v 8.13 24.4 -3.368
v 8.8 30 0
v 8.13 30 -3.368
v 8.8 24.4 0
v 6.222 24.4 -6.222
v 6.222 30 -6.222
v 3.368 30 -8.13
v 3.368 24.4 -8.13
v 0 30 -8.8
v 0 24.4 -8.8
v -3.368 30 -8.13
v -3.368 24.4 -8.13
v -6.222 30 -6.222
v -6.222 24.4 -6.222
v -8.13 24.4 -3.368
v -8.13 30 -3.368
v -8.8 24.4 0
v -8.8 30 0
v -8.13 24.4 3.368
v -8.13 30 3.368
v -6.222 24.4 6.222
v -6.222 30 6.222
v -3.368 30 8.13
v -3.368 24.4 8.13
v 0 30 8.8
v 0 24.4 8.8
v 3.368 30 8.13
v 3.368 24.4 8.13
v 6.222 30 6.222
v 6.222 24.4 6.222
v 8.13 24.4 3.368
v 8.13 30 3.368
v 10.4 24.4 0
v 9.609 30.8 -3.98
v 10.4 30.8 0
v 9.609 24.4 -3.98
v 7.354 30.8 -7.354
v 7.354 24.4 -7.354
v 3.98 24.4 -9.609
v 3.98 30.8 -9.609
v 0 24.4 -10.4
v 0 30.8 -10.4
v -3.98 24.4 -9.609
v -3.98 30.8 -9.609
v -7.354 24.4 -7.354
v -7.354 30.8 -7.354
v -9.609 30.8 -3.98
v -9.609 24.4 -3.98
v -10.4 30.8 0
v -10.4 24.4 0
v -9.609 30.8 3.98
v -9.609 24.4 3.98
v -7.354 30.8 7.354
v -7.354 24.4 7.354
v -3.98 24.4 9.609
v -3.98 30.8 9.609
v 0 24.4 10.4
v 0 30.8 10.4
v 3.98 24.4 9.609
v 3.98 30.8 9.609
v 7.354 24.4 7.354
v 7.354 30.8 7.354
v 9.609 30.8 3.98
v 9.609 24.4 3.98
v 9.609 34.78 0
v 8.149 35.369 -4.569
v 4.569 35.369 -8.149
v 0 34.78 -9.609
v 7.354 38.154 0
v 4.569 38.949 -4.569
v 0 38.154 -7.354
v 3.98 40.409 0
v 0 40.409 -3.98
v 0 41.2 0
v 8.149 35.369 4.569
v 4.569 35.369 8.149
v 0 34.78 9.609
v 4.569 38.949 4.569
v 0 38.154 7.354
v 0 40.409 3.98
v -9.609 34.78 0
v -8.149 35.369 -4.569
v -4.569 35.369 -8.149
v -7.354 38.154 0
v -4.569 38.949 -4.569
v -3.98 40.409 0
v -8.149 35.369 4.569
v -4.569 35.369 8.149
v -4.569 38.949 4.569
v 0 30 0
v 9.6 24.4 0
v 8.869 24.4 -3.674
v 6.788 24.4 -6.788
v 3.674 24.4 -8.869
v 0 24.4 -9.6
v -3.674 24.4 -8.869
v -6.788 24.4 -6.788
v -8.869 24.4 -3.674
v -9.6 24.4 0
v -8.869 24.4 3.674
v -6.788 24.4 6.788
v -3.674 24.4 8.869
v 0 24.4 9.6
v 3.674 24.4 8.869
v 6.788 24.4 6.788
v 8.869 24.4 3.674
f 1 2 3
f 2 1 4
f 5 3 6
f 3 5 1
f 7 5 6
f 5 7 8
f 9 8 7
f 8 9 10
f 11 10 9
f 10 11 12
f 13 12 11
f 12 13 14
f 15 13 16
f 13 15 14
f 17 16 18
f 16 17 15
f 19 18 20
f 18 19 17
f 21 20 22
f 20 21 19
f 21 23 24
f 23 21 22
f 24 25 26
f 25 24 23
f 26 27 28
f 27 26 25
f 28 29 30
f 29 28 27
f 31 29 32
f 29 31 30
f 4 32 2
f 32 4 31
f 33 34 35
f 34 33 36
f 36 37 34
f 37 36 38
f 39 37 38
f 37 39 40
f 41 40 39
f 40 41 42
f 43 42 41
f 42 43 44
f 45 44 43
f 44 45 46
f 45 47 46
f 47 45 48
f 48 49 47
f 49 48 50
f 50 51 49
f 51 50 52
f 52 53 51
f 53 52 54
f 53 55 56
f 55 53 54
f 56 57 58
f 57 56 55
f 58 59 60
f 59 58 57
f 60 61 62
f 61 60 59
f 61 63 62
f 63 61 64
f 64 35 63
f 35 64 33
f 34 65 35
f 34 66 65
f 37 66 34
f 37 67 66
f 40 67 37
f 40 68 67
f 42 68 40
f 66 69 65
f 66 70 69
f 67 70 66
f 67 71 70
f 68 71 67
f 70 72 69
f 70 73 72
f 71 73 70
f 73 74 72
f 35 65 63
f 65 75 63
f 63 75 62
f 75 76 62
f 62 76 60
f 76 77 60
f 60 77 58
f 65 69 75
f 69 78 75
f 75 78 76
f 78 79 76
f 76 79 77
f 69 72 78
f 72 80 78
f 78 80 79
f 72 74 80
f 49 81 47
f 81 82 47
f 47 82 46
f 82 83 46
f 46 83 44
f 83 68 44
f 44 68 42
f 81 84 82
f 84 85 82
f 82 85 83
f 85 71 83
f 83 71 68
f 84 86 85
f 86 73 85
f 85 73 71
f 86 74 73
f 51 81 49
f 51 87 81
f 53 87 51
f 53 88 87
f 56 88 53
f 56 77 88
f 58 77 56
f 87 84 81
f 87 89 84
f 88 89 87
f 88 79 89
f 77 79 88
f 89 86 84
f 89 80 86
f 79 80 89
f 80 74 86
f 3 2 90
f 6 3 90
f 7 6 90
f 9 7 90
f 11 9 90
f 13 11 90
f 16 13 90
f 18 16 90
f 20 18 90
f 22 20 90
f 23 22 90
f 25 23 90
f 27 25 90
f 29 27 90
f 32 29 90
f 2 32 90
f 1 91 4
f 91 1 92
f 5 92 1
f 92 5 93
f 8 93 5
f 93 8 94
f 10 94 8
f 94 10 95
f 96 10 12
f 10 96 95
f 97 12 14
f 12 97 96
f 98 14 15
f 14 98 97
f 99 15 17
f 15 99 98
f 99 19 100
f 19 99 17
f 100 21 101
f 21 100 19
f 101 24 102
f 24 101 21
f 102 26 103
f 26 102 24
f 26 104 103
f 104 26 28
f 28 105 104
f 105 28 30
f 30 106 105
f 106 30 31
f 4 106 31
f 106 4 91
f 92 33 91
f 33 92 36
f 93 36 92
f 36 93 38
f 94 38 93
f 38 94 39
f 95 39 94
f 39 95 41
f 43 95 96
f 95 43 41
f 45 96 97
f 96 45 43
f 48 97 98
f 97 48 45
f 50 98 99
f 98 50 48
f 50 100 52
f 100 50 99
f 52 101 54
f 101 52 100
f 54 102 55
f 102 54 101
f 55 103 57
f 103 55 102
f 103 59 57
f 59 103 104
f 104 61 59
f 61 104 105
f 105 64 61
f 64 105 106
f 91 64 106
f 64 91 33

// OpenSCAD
// file: ../p/stud3.scad
use <../lib.scad>
use <4-4cyli.scad>
use <4-4disc.scad>
use <4-4edge.scad>
$fa=1; $fs=0.2;
function ldraw_lib__stud3(realsolid=false) = realsolid ? 
    [openscad(translate([0,0,-eps()], o=cylinder(4+eps(), r=4)),2)] : [
// 0 Stud Tube Solid
// 0 Name: stud3.dat
// 0 Author: James Jessiman
// 0 !LDRAW_ORG Primitive UPDATE 2012-01
// 0 !LICENSE Licensed under CC BY 2.0 and CC BY 4.0 : see CAreadme.txt
// 
// 0 BFC CERTIFY CCW
  [0,"BFC","CERTIFY"],
  [0,"BFC","CCW"],
// 
// 0 !HISTORY 2002-04-04 [sbliss] Modified for BFC compliance
// 0 !HISTORY 2002-04-25 [PTadmin] Official Update 2002-02
// 0 !HISTORY 2007-06-24 [PTadmin] Header formatted for Contributor Agreement
// 0 !HISTORY 2008-07-01 [PTadmin] Official Update 2008-01
// 0 !HISTORY 2012-02-16 [Philo] Changed to CCW
// 0 !HISTORY 2012-03-30 [PTadmin] Official Update 2012-01
// 
// 
// 1 16 0 -4 0 4 0 0 0 1 0 0 0 4 4-4edge.dat
  [1,16,0,-4,0,4,0,0,0,1,0,0,0,4, ldraw_lib__4_4edge(realsolid)],
// 1 16 0 0 0 4 0 0 0 1 0 0 0 4 4-4edge.dat
  [1,16,0,0,0,4,0,0,0,1,0,0,0,4, ldraw_lib__4_4edge(realsolid)],
// 1 16 0 -4 0 4 0 0 0 1 0 0 0 4 4-4disc.dat
  [1,16,0,-4,0,4,0,0,0,1,0,0,0,4, ldraw_lib__4_4disc(realsolid)],
// 1 16 0 -4 0 4 0 0 0 4 0 0 0 4 4-4cyli.dat
  [1,16,0,-4,0,4,0,0,0,4,0,0,0,4, ldraw_lib__4_4cyli(realsolid)],
];
module ldraw_lib__stud3(step=0, col=false, unit=2/5, alt=false, line=0.2, solid=!$preview)
    makepoly(ldraw_lib__stud3(solid), step=step, col=col, unit=unit, alt=alt, line=line, solid=solid);
ldraw_lib__stud3(line=0.2);
// file: ../p/stud.scad
use <../lib.scad>
use <4-4cyli.scad>
use <4-4disc.scad>
use <4-4edge.scad>
$fa=1; $fs=0.2;
function ldraw_lib__stud(realsolid=false) = realsolid ? 
    [openscad(translate([0,0,-eps()], o=cylinder(4+eps(), r=6)),2)] : [
// 0 Stud
// 0 Name: stud.dat
// 0 Author: James Jessiman
// 0 !LDRAW_ORG Primitive UPDATE 2012-01
// 0 !LICENSE Licensed under CC BY 2.0 and CC BY 4.0 : see CAreadme.txt
// 
// 0 BFC CERTIFY CCW
  [0,"BFC","CERTIFY"],
  [0,"BFC","CCW"],
// 
// 0 !HISTORY 2002-04-04 [sbliss] Modified for BFC compliance
// 0 !HISTORY 2002-04-25 [PTadmin] Official Update 2002-02
// 0 !HISTORY 2007-06-24 [PTadmin] Header formatted for Contributor Agreement
// 0 !HISTORY 2008-07-01 [PTadmin] Official Update 2008-01
// 0 !HISTORY 2012-02-16 [Philo] Changed to CCW
// 0 !HISTORY 2012-03-30 [PTadmin] Official Update 2012-01
// 
// 
// 1 16 0 0 0 6 0 0 0 1 0 0 0 6 4-4edge.dat
  [1,16,0,0,0,6,0,0,0,1,0,0,0,6, ldraw_lib__4_4edge(realsolid)],
// 1 16 0 -4 0 6 0 0 0 1 0 0 0 6 4-4edge.dat
  [1,16,0,-4,0,6,0,0,0,1,0,0,0,6, ldraw_lib__4_4edge(realsolid)],
// 1 16 0 0 0 6 0 0 0 -4 0 0 0 6 4-4cyli.dat
  [1,16,0,0,0,6,0,0,0,-4,0,0,0,6, ldraw_lib__4_4cyli(realsolid)],
// 1 16 0 -4 0 6 0 0 0 1 0 0 0 6 4-4disc.dat
  [1,16,0,-4,0,6,0,0,0,1,0,0,0,6, ldraw_lib__4_4disc(realsolid)],
];
module ldraw_lib__stud(step=0, col=false, unit=2/5, alt=false, line=0.2, solid=!$preview)
    makepoly(ldraw_lib__stud(solid), step=step, col=col, unit=unit, alt=alt, line=line, solid=solid);
ldraw_lib__stud(line=0.2);
// file: ../p/box5.scad
use <../lib.scad>
$fa=1; $fs=0.2;
function ldraw_lib__box5(realsolid=false) = [
// 0 Box with 5 Faces and All Edges
// 0 Name: box5.dat
// 0 Author: James Jessiman
// 0 !LDRAW_ORG Primitive UPDATE 2012-01
// 0 !LICENSE Licensed under CC BY 2.0 and CC BY 4.0 : see CAreadme.txt
// 
// 0 BFC CERTIFY CCW
  [0,"BFC","CERTIFY"],
  [0,"BFC","CCW"],
// 
// 0 !HISTORY 2002-04-03 [sbliss] Modified for BFC compliance
// 0 !HISTORY 2002-04-25 [PTadmin] Official Update 2002-02
// 0 !HISTORY 2007-06-24 [PTadmin] Header formatted for Contributor Agreement
// 0 !HISTORY 2008-07-01 [PTadmin] Official Update 2008-01
// 0 !HISTORY 2012-02-16 [Philo] Changed to CCW
// 0 !HISTORY 2012-03-30 [PTadmin] Official Update 2012-01
// 
// 
// 2 24 1 1 1 -1 1 1
  [2,24,1,1,1,-1,1,1],
// 2 24 -1 1 1 -1 1 -1
  [2,24,-1,1,1,-1,1,-1],
// 2 24 -1 1 -1 1 1 -1
  [2,24,-1,1,-1,1,1,-1],
// 2 24 1 1 -1 1 1 1
  [2,24,1,1,-1,1,1,1],
// 2 24 1 0 1 -1 0 1
  [2,24,1,0,1,-1,0,1],
// 2 24 -1 0 1 -1 0 -1
  [2,24,-1,0,1,-1,0,-1],
// 2 24 -1 0 -1 1 0 -1
  [2,24,-1,0,-1,1,0,-1],
// 2 24 1 0 -1 1 0 1
  [2,24,1,0,-1,1,0,1],
// 2 24 1 0 1 1 1 1
  [2,24,1,0,1,1,1,1],
// 2 24 -1 0 1 -1 1 1
  [2,24,-1,0,1,-1,1,1],
// 2 24 1 0 -1 1 1 -1
  [2,24,1,0,-1,1,1,-1],
// 2 24 -1 0 -1 -1 1 -1
  [2,24,-1,0,-1,-1,1,-1],
// 4 16 -1 1 1 1 1 1 1 1 -1 -1 1 -1
  [4,16,-1,1,1,1,1,1,1,1,-1,-1,1,-1],
// 4 16 -1 1 1 -1 0 1 1 0 1 1 1 1
  [4,16,-1,1,1,-1,0,1,1,0,1,1,1,1],
// 4 16 -1 1 -1 -1 0 -1 -1 0 1 -1 1 1
  [4,16,-1,1,-1,-1,0,-1,-1,0,1,-1,1,1],
// 4 16 1 1 -1 1 0 -1 -1 0 -1 -1 1 -1
  [4,16,1,1,-1,1,0,-1,-1,0,-1,-1,1,-1],
// 4 16 1 1 1 1 0 1 1 0 -1 1 1 -1
  [4,16,1,1,1,1,0,1,1,0,-1,1,1,-1],
];
module ldraw_lib__box5(step=0, col=false, unit=2/5, alt=false, line=0.2, solid=!$preview)
    makepoly(ldraw_lib__box5(solid), step=step, col=col, unit=unit, alt=alt, line=line, solid=solid);
ldraw_lib__box5(line=0.2);
// file: ../p/box4t.scad
use <../lib.scad>
$fa=1; $fs=0.2;
function ldraw_lib__box4t(realsolid=false) = [
// 0 Box with 4 Adjacent Faces and All Edges
// 0 Name: box4t.dat
// 0 Author: Tore Eriksson [Tore_Eriksson]
// 0 !LDRAW_ORG Primitive UPDATE 2003-02
// 0 !LICENSE Licensed under CC BY 2.0 and CC BY 4.0 : see CAreadme.txt
// 
// 0 BFC CERTIFY CCW
  [0,"BFC","CERTIFY"],
  [0,"BFC","CCW"],
// 
// 0 !HISTORY 1997-09-29 [PTadmin] Official Update 1997-15
// 0 !HISTORY 2002-08-31 [izanette] Modified with WINDZ for BFC compliance
// 0 !HISTORY 2003-08-01 [PTadmin] Official Update 2003-02
// 0 !HISTORY 2007-06-24 [PTadmin] Header formatted for Contributor Agreement
// 0 !HISTORY 2008-07-01 [PTadmin] Official Update 2008-01
// 
// 
// 2 24 1 1 1 -1 1 1
  [2,24,1,1,1,-1,1,1],
// 2 24 -1 1 1 -1 1 -1
  [2,24,-1,1,1,-1,1,-1],
// 2 24 -1 1 -1 1 1 -1
  [2,24,-1,1,-1,1,1,-1],
// 2 24 1 1 -1 1 1 1
  [2,24,1,1,-1,1,1,1],
// 2 24 1 0 1 -1 0 1
  [2,24,1,0,1,-1,0,1],
// 2 24 -1 0 1 -1 0 -1
  [2,24,-1,0,1,-1,0,-1],
// 2 24 -1 0 -1 1 0 -1
  [2,24,-1,0,-1,1,0,-1],
// 2 24 1 0 -1 1 0 1
  [2,24,1,0,-1,1,0,1],
// 2 24 1 0 1 1 1 1
  [2,24,1,0,1,1,1,1],
// 2 24 -1 0 1 -1 1 1
  [2,24,-1,0,1,-1,1,1],
// 2 24 1 0 -1 1 1 -1
  [2,24,1,0,-1,1,1,-1],
// 2 24 -1 0 -1 -1 1 -1
  [2,24,-1,0,-1,-1,1,-1],
// 4 16 1 1 1 1 1 -1 -1 1 -1 -1 1 1
  [4,16,1,1,1,1,1,-1,-1,1,-1,-1,1,1],
// 4 16 1 1 1 -1 1 1 -1 0 1 1 0 1
  [4,16,1,1,1,-1,1,1,-1,0,1,1,0,1],
// 4 16 -1 1 1 -1 1 -1 -1 0 -1 -1 0 1
  [4,16,-1,1,1,-1,1,-1,-1,0,-1,-1,0,1],
// 0 4 16 -1 1 -1 -1 0 -1 1 0 -1 1 1 -1
// 4 16 1 1 -1 1 1 1 1 0 1 1 0 -1
  [4,16,1,1,-1,1,1,1,1,0,1,1,0,-1],
// 0
];
module ldraw_lib__box4t(step=0, col=false, unit=2/5, alt=false, line=0.2, solid=!$preview)
    makepoly(ldraw_lib__box4t(solid), step=step, col=col, unit=unit, alt=alt, line=line, solid=solid);
ldraw_lib__box4t(line=0.2);
// file: ../p/1-8sphe.scad
use <../lib.scad>
$fa=1; $fs=0.2;
function ldraw_lib__1_8sphe(realsolid=false) = [
// 0 Sphere 0.125
// 0 Name: 1-8sphe.dat
// 0 Author: James Jessiman
// 0 !LDRAW_ORG Primitive UPDATE 2012-03
// 0 !LICENSE Licensed under CC BY 2.0 and CC BY 4.0 : see CAreadme.txt
// 
// 0 BFC CERTIFY CCW
  [0,"BFC","CERTIFY"],
  [0,"BFC","CCW"],
// 
// 0 !HISTORY 2000-08-01 {Axel Poque} fixes to resolve L3P error messages.
// 0 !HISTORY 2000-08-01 {Manfred Moolhuysen} fixes to resolve L3P error messages.
// 0 !HISTORY 2000-09-30 [PTadmin] Official Update 2000-02
// 0 !HISTORY 2002-03-28 [hafhead] Made BFC compliant
// 0 !HISTORY 2002-04-25 [PTadmin] Official Update 2002-02
// 0 !HISTORY 2007-06-22 [PTadmin] Header formatted for Contributor Agreement
// 0 !HISTORY 2008-07-01 [PTadmin] Official Update 2008-01
// 0 !HISTORY 2010-09-12 [MagFors] Changed winding, removed duplicated cond-line, optimized filesize
// 0 !HISTORY 2010-12-31 [PTadmin] Official Update 2010-03
// 0 !HISTORY 2012-07-01 [tcobbs] Replaced with geometry from LDView
// 0 !HISTORY 2012-12-28 [PTadmin] Official Update 2012-03
// 
// 
// 3 16 1 0 0 0.9239 0.3827 0 0.9239 0 0.3827
  [3,16,1,0,0,0.9239,0.3827,0,0.9239,0,0.3827],
// 3 16 0.9239 0.3827 0 0.7836 0.4393 0.4393 0.9239 0 0.3827
  [3,16,0.9239,0.3827,0,0.7836,0.4393,0.4393,0.9239,0,0.3827],
// 3 16 0.9239 0 0.3827 0.7836 0.4393 0.4393 0.7071 0 0.7071
  [3,16,0.9239,0,0.3827,0.7836,0.4393,0.4393,0.7071,0,0.7071],
// 3 16 0.7836 0.4393 0.4393 0.4393 0.4393 0.7836 0.7071 0 0.7071
  [3,16,0.7836,0.4393,0.4393,0.4393,0.4393,0.7836,0.7071,0,0.7071],
// 3 16 0.7071 0 0.7071 0.4393 0.4393 0.7836 0.3827 0 0.9239
  [3,16,0.7071,0,0.7071,0.4393,0.4393,0.7836,0.3827,0,0.9239],
// 3 16 0.4393 0.4393 0.7836 0 0.3827 0.9239 0.3827 0 0.9239
  [3,16,0.4393,0.4393,0.7836,0,0.3827,0.9239,0.3827,0,0.9239],
// 3 16 0.3827 0 0.9239 0 0.3827 0.9239 0 0 1
  [3,16,0.3827,0,0.9239,0,0.3827,0.9239,0,0,1],
// 3 16 0.9239 0.3827 0 0.7071 0.7071 0 0.7836 0.4393 0.4393
  [3,16,0.9239,0.3827,0,0.7071,0.7071,0,0.7836,0.4393,0.4393],
// 3 16 0.7071 0.7071 0 0.4393 0.7836 0.4393 0.7836 0.4393 0.4393
  [3,16,0.7071,0.7071,0,0.4393,0.7836,0.4393,0.7836,0.4393,0.4393],
// 3 16 0.7836 0.4393 0.4393 0.4393 0.7836 0.4393 0.4393 0.4393 0.7836
  [3,16,0.7836,0.4393,0.4393,0.4393,0.7836,0.4393,0.4393,0.4393,0.7836],
// 3 16 0.4393 0.7836 0.4393 0 0.7071 0.7071 0.4393 0.4393 0.7836
  [3,16,0.4393,0.7836,0.4393,0,0.7071,0.7071,0.4393,0.4393,0.7836],
// 3 16 0.4393 0.4393 0.7836 0 0.7071 0.7071 0 0.3827 0.9239
  [3,16,0.4393,0.4393,0.7836,0,0.7071,0.7071,0,0.3827,0.9239],
// 3 16 0.7071 0.7071 0 0.3827 0.9239 0 0.4393 0.7836 0.4393
  [3,16,0.7071,0.7071,0,0.3827,0.9239,0,0.4393,0.7836,0.4393],
// 3 16 0.3827 0.9239 0 0 0.9239 0.3827 0.4393 0.7836 0.4393
  [3,16,0.3827,0.9239,0,0,0.9239,0.3827,0.4393,0.7836,0.4393],
// 3 16 0.4393 0.7836 0.4393 0 0.9239 0.3827 0 0.7071 0.7071
  [3,16,0.4393,0.7836,0.4393,0,0.9239,0.3827,0,0.7071,0.7071],
// 3 16 0.3827 0.9239 0 0 1 0 0 0.9239 0.3827
  [3,16,0.3827,0.9239,0,0,1,0,0,0.9239,0.3827],
// 
// 5 24 1 0 0 0.9239 0.3827 0 1 0 -0.1 0.9239 0 0.3827
  [5,24,1,0,0,0.9239,0.3827,0,1,0,-0.1,0.9239,0,0.3827],
// 5 24 0.9239 0.3827 0 0.9239 0 0.3827 1 0 0 0.7836 0.4393 0.4393
  [5,24,0.9239,0.3827,0,0.9239,0,0.3827,1,0,0,0.7836,0.4393,0.4393],
// 5 24 1 0 0 0.9239 0 0.3827 0.9239 0.3827 0 1 -0.1 0
  [5,24,1,0,0,0.9239,0,0.3827,0.9239,0.3827,0,1,-0.1,0],
// 5 24 0.9239 0 0.3827 0.7836 0.4393 0.4393 0.9239 0.3827 0 0.7071 0 0.7071
  [5,24,0.9239,0,0.3827,0.7836,0.4393,0.4393,0.9239,0.3827,0,0.7071,0,0.7071],
// 5 24 0.7836 0.4393 0.4393 0.7071 0 0.7071 0.9239 0 0.3827 0.4393 0.4393 0.7836
  [5,24,0.7836,0.4393,0.4393,0.7071,0,0.7071,0.9239,0,0.3827,0.4393,0.4393,0.7836],
// 5 24 0.9239 0 0.3827 0.7071 0 0.7071 0.7836 0.4393 0.4393 0.9239 -0.1 0.3827
  [5,24,0.9239,0,0.3827,0.7071,0,0.7071,0.7836,0.4393,0.4393,0.9239,-0.1,0.3827],
// 5 24 0.7071 0 0.7071 0.4393 0.4393 0.7836 0.7836 0.4393 0.4393 0.3827 0 0.9239
  [5,24,0.7071,0,0.7071,0.4393,0.4393,0.7836,0.7836,0.4393,0.4393,0.3827,0,0.9239],
// 5 24 0.4393 0.4393 0.7836 0.3827 0 0.9239 0.7071 0 0.7071 0 0.3827 0.9239
  [5,24,0.4393,0.4393,0.7836,0.3827,0,0.9239,0.7071,0,0.7071,0,0.3827,0.9239],
// 5 24 0.7071 0 0.7071 0.3827 0 0.9239 0.4393 0.4393 0.7836 0.7071 -0.1 0.7071
  [5,24,0.7071,0,0.7071,0.3827,0,0.9239,0.4393,0.4393,0.7836,0.7071,-0.1,0.7071],
// 5 24 0.3827 0 0.9239 0 0.3827 0.9239 0.4393 0.4393 0.7836 0 0 1
  [5,24,0.3827,0,0.9239,0,0.3827,0.9239,0.4393,0.4393,0.7836,0,0,1],
// 5 24 0 0.3827 0.9239 0 0 1 0.3827 0 0.9239 -0.1 0.3827 0.9239
  [5,24,0,0.3827,0.9239,0,0,1,0.3827,0,0.9239,-0.1,0.3827,0.9239],
// 5 24 0.3827 0 0.9239 0 0 1 0 0.3827 0.9239 0.3827 -0.1 0.9239
  [5,24,0.3827,0,0.9239,0,0,1,0,0.3827,0.9239,0.3827,-0.1,0.9239],
// 5 24 0.9239 0.3827 0 0.7071 0.7071 0 0.9239 0.3827 -0.1 0.7836 0.4393 0.4393
  [5,24,0.9239,0.3827,0,0.7071,0.7071,0,0.9239,0.3827,-0.1,0.7836,0.4393,0.4393],
// 5 24 0.7071 0.7071 0 0.7836 0.4393 0.4393 0.9239 0.3827 0 0.4393 0.7836 0.4393
  [5,24,0.7071,0.7071,0,0.7836,0.4393,0.4393,0.9239,0.3827,0,0.4393,0.7836,0.4393],
// 5 24 0.9239 0.3827 0 0.7836 0.4393 0.4393 0.7071 0.7071 0 0.9239 0 0.3827
  [5,24,0.9239,0.3827,0,0.7836,0.4393,0.4393,0.7071,0.7071,0,0.9239,0,0.3827],
// 5 24 0.7836 0.4393 0.4393 0.4393 0.7836 0.4393 0.7071 0.7071 0 0.4393 0.4393 0.7836
  [5,24,0.7836,0.4393,0.4393,0.4393,0.7836,0.4393,0.7071,0.7071,0,0.4393,0.4393,0.7836],
// 5 24 0.4393 0.7836 0.4393 0.4393 0.4393 0.7836 0.7836 0.4393 0.4393 0 0.7071 0.7071
  [5,24,0.4393,0.7836,0.4393,0.4393,0.4393,0.7836,0.7836,0.4393,0.4393,0,0.7071,0.7071],
// 5 24 0.7836 0.4393 0.4393 0.4393 0.4393 0.7836 0.4393 0.7836 0.4393 0.7071 0 0.7071
  [5,24,0.7836,0.4393,0.4393,0.4393,0.4393,0.7836,0.4393,0.7836,0.4393,0.7071,0,0.7071],
// 5 24 0.4393 0.4393 0.7836 0 0.7071 0.7071 0.4393 0.7836 0.4393 0 0.3827 0.9239
  [5,24,0.4393,0.4393,0.7836,0,0.7071,0.7071,0.4393,0.7836,0.4393,0,0.3827,0.9239],
// 5 24 0 0.7071 0.7071 0 0.3827 0.9239 0.4393 0.4393 0.7836 -0.1 0.7071 0.7071
  [5,24,0,0.7071,0.7071,0,0.3827,0.9239,0.4393,0.4393,0.7836,-0.1,0.7071,0.7071],
// 5 24 0.4393 0.4393 0.7836 0 0.3827 0.9239 0 0.7071 0.7071 0.3827 0 0.9239
  [5,24,0.4393,0.4393,0.7836,0,0.3827,0.9239,0,0.7071,0.7071,0.3827,0,0.9239],
// 5 24 0.7071 0.7071 0 0.3827 0.9239 0 0.7071 0.7071 -0.1 0.4393 0.7836 0.4393
  [5,24,0.7071,0.7071,0,0.3827,0.9239,0,0.7071,0.7071,-0.1,0.4393,0.7836,0.4393],
// 5 24 0.3827 0.9239 0 0.4393 0.7836 0.4393 0.7071 0.7071 0 0 0.9239 0.3827
  [5,24,0.3827,0.9239,0,0.4393,0.7836,0.4393,0.7071,0.7071,0,0,0.9239,0.3827],
// 5 24 0.7071 0.7071 0 0.4393 0.7836 0.4393 0.3827 0.9239 0 0.7836 0.4393 0.4393
  [5,24,0.7071,0.7071,0,0.4393,0.7836,0.4393,0.3827,0.9239,0,0.7836,0.4393,0.4393],
// 5 24 0.4393 0.7836 0.4393 0 0.9239 0.3827 0.3827 0.9239 0 0 0.7071 0.7071
  [5,24,0.4393,0.7836,0.4393,0,0.9239,0.3827,0.3827,0.9239,0,0,0.7071,0.7071],
// 5 24 0 0.9239 0.3827 0 0.7071 0.7071 0.4393 0.7836 0.4393 -0.1 0.9239 0.3827
  [5,24,0,0.9239,0.3827,0,0.7071,0.7071,0.4393,0.7836,0.4393,-0.1,0.9239,0.3827],
// 5 24 0.4393 0.7836 0.4393 0 0.7071 0.7071 0 0.9239 0.3827 0.4393 0.4393 0.7836
  [5,24,0.4393,0.7836,0.4393,0,0.7071,0.7071,0,0.9239,0.3827,0.4393,0.4393,0.7836],
// 5 24 0.3827 0.9239 0 0 1 0 0.3827 0.9239 -0.1 0 0.9239 0.3827
  [5,24,0.3827,0.9239,0,0,1,0,0.3827,0.9239,-0.1,0,0.9239,0.3827],
// 5 24 0 1 0 0 0.9239 0.3827 0.3827 0.9239 0 -0.1 1 0
  [5,24,0,1,0,0,0.9239,0.3827,0.3827,0.9239,0,-0.1,1,0],
// 5 24 0.3827 0.9239 0 0 0.9239 0.3827 0 1 0 0.4393 0.7836 0.4393
  [5,24,0.3827,0.9239,0,0,0.9239,0.3827,0,1,0,0.4393,0.7836,0.4393],
];
module ldraw_lib__1_8sphe(step=0, col=false, unit=2/5, alt=false, line=0.2, solid=!$preview)
    makepoly(ldraw_lib__1_8sphe(solid), step=step, col=col, unit=unit, alt=alt, line=line, solid=solid);
ldraw_lib__1_8sphe(line=0.2);
// file: s/3004s01.scad
use <../../lib.scad>
use <../../p/box4t.scad>
use <../../p/box5.scad>
use <../../p/stud.scad>
use <../../p/stud3.scad>
$fa=1; $fs=0.2;
function ldraw_lib__s__3004s01(realsolid=false) = [
// 0 ~Brick  1 x  2 without Front Face
// 0 Name: s\3004s01.dat
// 0 Author: James Jessiman
// 0 !LDRAW_ORG Subpart UPDATE 2003-03
// 0 !LICENSE Licensed under CC BY 2.0 and CC BY 4.0 : see CAreadme.txt
// 
// 0 BFC CERTIFY CCW
  [0,"BFC","CERTIFY"],
  [0,"BFC","CCW"],
// 
// 0 !HISTORY 2003-09-07 [jriley] Subfiling, BFC
// 0 !HISTORY 2003-12-19 [PTadmin] Official Update 2003-03
// 0 !HISTORY 2007-08-29 [PTadmin] Header formatted for Contributor Agreement
// 0 !HISTORY 2008-07-01 [PTadmin] Official Update 2008-01
// 
// 
// 1 16 0 4 0 1 0 0 0 -5 0 0 0 1 stud3.dat
  [1,16,0,4,0,1,0,0,0,-5,0,0,0,1, ldraw_lib__stud3(realsolid)],
// 0 BFC INVERTNEXT
  [0,"BFC","INVERTNEXT"],
// 1 16 0 24 0 16 0 0 0 -20 0 0 0 6 box5.dat
  [1,16,0,24,0,16,0,0,0,-20,0,0,0,6, ldraw_lib__box5(realsolid)],
// 4 16 20 24 10 16 24 6 -16 24 6 -20 24 10
  [4,16,20,24,10,16,24,6,-16,24,6,-20,24,10],
// 4 16 -20 24 10 -16 24 6 -16 24 -6 -20 24 -10
  [4,16,-20,24,10,-16,24,6,-16,24,-6,-20,24,-10],
// 4 16 -20 24 -10 -16 24 -6 16 24 -6 20 24 -10
  [4,16,-20,24,-10,-16,24,-6,16,24,-6,20,24,-10],
// 4 16 20 24 -10 16 24 -6 16 24 6 20 24 10
  [4,16,20,24,-10,16,24,-6,16,24,6,20,24,10],
// 1 16 0 24 0 20 0 0 0 -24 0 0 0 10 box4t.dat
  [1,16,0,24,0,20,0,0,0,-24,0,0,0,10, ldraw_lib__box4t(realsolid)],
// 1 16 10 0 0 1 0 0 0 1 0 0 0 1 stud.dat
  [1,16,10,0,0,1,0,0,0,1,0,0,0,1, ldraw_lib__stud(realsolid)],
// 1 16 -10 0 0 1 0 0 0 1 0 0 0 1 stud.dat
  [1,16,-10,0,0,1,0,0,0,1,0,0,0,1, ldraw_lib__stud(realsolid)],
// 0
];
module ldraw_lib__s__3004s01(step=0, col=false, unit=2/5, alt=false, line=0.2, solid=!$preview)
    makepoly(ldraw_lib__s__3004s01(solid), step=step, col=col, unit=unit, alt=alt, line=line, solid=solid);
ldraw_lib__s__3004s01(line=0.2);
// file: ../p/4-8sphe.scad
use <../lib.scad>
use <1-8sphe.scad>
$fa=1; $fs=0.2;
function ldraw_lib__4_8sphe(realsolid=false) = [
// 0 Sphere 0.5
// 0 Name: 4-8sphe.dat
// 0 Author: James Jessiman
// 0 !LDRAW_ORG Primitive UPDATE 2003-02
// 0 !LICENSE Licensed under CC BY 2.0 and CC BY 4.0 : see CAreadme.txt
// 
// 0 BFC CERTIFY CCW
  [0,"BFC","CERTIFY"],
  [0,"BFC","CCW"],
// 
// 0 !HISTORY 2002-08-31 [izanette] Modified with WINDZ for BFC compliance
// 0 !HISTORY 2003-08-01 [PTadmin] Official Update 2003-02
// 0 !HISTORY 2007-06-24 [PTadmin] Header formatted for Contributor Agreement
// 0 !HISTORY 2008-07-01 [PTadmin] Official Update 2008-01
// 
// 
// 1 16 0 0 0 1 0 0 0 1 0 0 0 1 1-8sphe.dat
  [1,16,0,0,0,1,0,0,0,1,0,0,0,1, ldraw_lib__1_8sphe(realsolid)],
// 1 16 0 0 0 1 0 0 0 1 0 0 0 -1 1-8sphe.dat
  [1,16,0,0,0,1,0,0,0,1,0,0,0,-1, ldraw_lib__1_8sphe(realsolid)],
// 1 16 0 0 0 -1 0 0 0 1 0 0 0 1 1-8sphe.dat
  [1,16,0,0,0,-1,0,0,0,1,0,0,0,1, ldraw_lib__1_8sphe(realsolid)],
// 1 16 0 0 0 -1 0 0 0 1 0 0 0 -1 1-8sphe.dat
  [1,16,0,0,0,-1,0,0,0,1,0,0,0,-1, ldraw_lib__1_8sphe(realsolid)],
// 0
// 
];
module ldraw_lib__4_8sphe(step=0, col=false, unit=2/5, alt=false, line=0.2, solid=!$preview)
    makepoly(ldraw_lib__4_8sphe(solid), step=step, col=col, unit=unit, alt=alt, line=line, solid=solid);
ldraw_lib__4_8sphe(line=0.2);
// file: ../p/4-4rin12.scad
use <../lib.scad>
$fa=1; $fs=0.2;
function ldraw_lib__4_4rin12(realsolid=false) = [
// 0 Ring 12 x 1.0
// 0 Name: 4-4rin12.dat
// 0 Author: John Riley [jriley]
// 0 !LDRAW_ORG Primitive UPDATE 2003-03
// 0 !LICENSE Licensed under CC BY 2.0 and CC BY 4.0 : see CAreadme.txt
// 
// 0 BFC CERTIFY CCW
  [0,"BFC","CERTIFY"],
  [0,"BFC","CCW"],
// 
// 0 !HISTORY 2003-12-19 [PTadmin] Official Update 2003-03
// 0 !HISTORY 2007-06-24 [PTadmin] Header formatted for Contributor Agreement
// 0 !HISTORY 2008-07-01 [PTadmin] Official Update 2008-01
// 
// 
// 4 16 12 0 0 13 0 0 12.0107 0 4.9751 11.0868 0 4.5924
  [4,16,12,0,0,13,0,0,12.0107,0,4.9751,11.0868,0,4.5924],
// 4 16 11.0868 0 4.5924 12.0107 0 4.9751 9.1923 0 9.1923 8.4852 0 8.4852
  [4,16,11.0868,0,4.5924,12.0107,0,4.9751,9.1923,0,9.1923,8.4852,0,8.4852],
// 4 16 8.4852 0 8.4852 9.1923 0 9.1923 4.9751 0 12.0107 4.5924 0 11.0868
  [4,16,8.4852,0,8.4852,9.1923,0,9.1923,4.9751,0,12.0107,4.5924,0,11.0868],
// 4 16 4.5924 0 11.0868 4.9751 0 12.0107 0 0 13 0 0 12
  [4,16,4.5924,0,11.0868,4.9751,0,12.0107,0,0,13,0,0,12],
// 4 16 0 0 12 0 0 13 -4.9751 0 12.0107 -4.5924 0 11.0868
  [4,16,0,0,12,0,0,13,-4.9751,0,12.0107,-4.5924,0,11.0868],
// 4 16 -4.5924 0 11.0868 -4.9751 0 12.0107 -9.1923 0 9.1923 -8.4852 0 8.4852
  [4,16,-4.5924,0,11.0868,-4.9751,0,12.0107,-9.1923,0,9.1923,-8.4852,0,8.4852],
// 4 16 -8.4852 0 8.4852 -9.1923 0 9.1923 -12.0107 0 4.9751 -11.0868 0 4.5924
  [4,16,-8.4852,0,8.4852,-9.1923,0,9.1923,-12.0107,0,4.9751,-11.0868,0,4.5924],
// 4 16 -11.0868 0 4.5924 -12.0107 0 4.9751 -13 0 0 -12 0 0
  [4,16,-11.0868,0,4.5924,-12.0107,0,4.9751,-13,0,0,-12,0,0],
// 4 16 -12 0 0 -13 0 0 -12.0107 0 -4.9751 -11.0868 0 -4.5924
  [4,16,-12,0,0,-13,0,0,-12.0107,0,-4.9751,-11.0868,0,-4.5924],
// 4 16 -11.0868 0 -4.5924 -12.0107 0 -4.9751 -9.1923 0 -9.1923 -8.4852 0 -8.4852
  [4,16,-11.0868,0,-4.5924,-12.0107,0,-4.9751,-9.1923,0,-9.1923,-8.4852,0,-8.4852],
// 4 16 -8.4852 0 -8.4852 -9.1923 0 -9.1923 -4.9751 0 -12.0107 -4.5924 0 -11.0868
  [4,16,-8.4852,0,-8.4852,-9.1923,0,-9.1923,-4.9751,0,-12.0107,-4.5924,0,-11.0868],
// 4 16 -4.5924 0 -11.0868 -4.9751 0 -12.0107 0 0 -13 0 0 -12
  [4,16,-4.5924,0,-11.0868,-4.9751,0,-12.0107,0,0,-13,0,0,-12],
// 4 16 0 0 -12 0 0 -13 4.9751 0 -12.0107 4.5924 0 -11.0868
  [4,16,0,0,-12,0,0,-13,4.9751,0,-12.0107,4.5924,0,-11.0868],
// 4 16 4.5924 0 -11.0868 4.9751 0 -12.0107 9.1923 0 -9.1923 8.4852 0 -8.4852
  [4,16,4.5924,0,-11.0868,4.9751,0,-12.0107,9.1923,0,-9.1923,8.4852,0,-8.4852],
// 4 16 8.4852 0 -8.4852 9.1923 0 -9.1923 12.0107 0 -4.9751 11.0868 0 -4.5924
  [4,16,8.4852,0,-8.4852,9.1923,0,-9.1923,12.0107,0,-4.9751,11.0868,0,-4.5924],
// 4 16 11.0868 0 -4.5924 12.0107 0 -4.9751 13 0 0 12 0 0
  [4,16,11.0868,0,-4.5924,12.0107,0,-4.9751,13,0,0,12,0,0],
// 0
// 
];
module ldraw_lib__4_4rin12(step=0, col=false, unit=2/5, alt=false, line=0.2, solid=!$preview)
    makepoly(ldraw_lib__4_4rin12(solid), step=step, col=col, unit=unit, alt=alt, line=line, solid=solid);
ldraw_lib__4_4rin12(line=0.2);
// file: ../p/4-4rin11.scad
use <../lib.scad>
$fa=1; $fs=0.2;
function ldraw_lib__4_4rin11(realsolid=false) = [
// 0 Ring 11 x 1.0
// 0 Name: 4-4rin11.dat
// 0 Author: John Riley [jriley]
// 0 !LDRAW_ORG Primitive UPDATE 2003-03
// 0 !LICENSE Licensed under CC BY 2.0 and CC BY 4.0 : see CAreadme.txt
// 
// 0 BFC CERTIFY CCW
  [0,"BFC","CERTIFY"],
  [0,"BFC","CCW"],
// 
// 0 !HISTORY 2003-12-19 [PTadmin] Official Update 2003-03
// 0 !HISTORY 2007-06-24 [PTadmin] Header formatted for Contributor Agreement
// 0 !HISTORY 2008-07-01 [PTadmin] Official Update 2008-01
// 
// 
// 4 16 11 0 0 12 0 0 11.0868 0 4.5924 10.1629 0 4.2097
  [4,16,11,0,0,12,0,0,11.0868,0,4.5924,10.1629,0,4.2097],
// 4 16 10.1629 0 4.2097 11.0868 0 4.5924 8.4852 0 8.4852 7.7781 0 7.7781
  [4,16,10.1629,0,4.2097,11.0868,0,4.5924,8.4852,0,8.4852,7.7781,0,7.7781],
// 4 16 7.7781 0 7.7781 8.4852 0 8.4852 4.5924 0 11.0868 4.2097 0 10.1629
  [4,16,7.7781,0,7.7781,8.4852,0,8.4852,4.5924,0,11.0868,4.2097,0,10.1629],
// 4 16 4.2097 0 10.1629 4.5924 0 11.0868 0 0 12 0 0 11
  [4,16,4.2097,0,10.1629,4.5924,0,11.0868,0,0,12,0,0,11],
// 4 16 0 0 11 0 0 12 -4.5924 0 11.0868 -4.2097 0 10.1629
  [4,16,0,0,11,0,0,12,-4.5924,0,11.0868,-4.2097,0,10.1629],
// 4 16 -4.2097 0 10.1629 -4.5924 0 11.0868 -8.4852 0 8.4852 -7.7781 0 7.7781
  [4,16,-4.2097,0,10.1629,-4.5924,0,11.0868,-8.4852,0,8.4852,-7.7781,0,7.7781],
// 4 16 -7.7781 0 7.7781 -8.4852 0 8.4852 -11.0868 0 4.5924 -10.1629 0 4.2097
  [4,16,-7.7781,0,7.7781,-8.4852,0,8.4852,-11.0868,0,4.5924,-10.1629,0,4.2097],
// 4 16 -10.1629 0 4.2097 -11.0868 0 4.5924 -12 0 0 -11 0 0
  [4,16,-10.1629,0,4.2097,-11.0868,0,4.5924,-12,0,0,-11,0,0],
// 4 16 -11 0 0 -12 0 0 -11.0868 0 -4.5924 -10.1629 0 -4.2097
  [4,16,-11,0,0,-12,0,0,-11.0868,0,-4.5924,-10.1629,0,-4.2097],
// 4 16 -10.1629 0 -4.2097 -11.0868 0 -4.5924 -8.4852 0 -8.4852 -7.7781 0 -7.7781
  [4,16,-10.1629,0,-4.2097,-11.0868,0,-4.5924,-8.4852,0,-8.4852,-7.7781,0,-7.7781],
// 4 16 -7.7781 0 -7.7781 -8.4852 0 -8.4852 -4.5924 0 -11.0868 -4.2097 0 -10.1629
  [4,16,-7.7781,0,-7.7781,-8.4852,0,-8.4852,-4.5924,0,-11.0868,-4.2097,0,-10.1629],
// 4 16 -4.2097 0 -10.1629 -4.5924 0 -11.0868 0 0 -12 0 0 -11
  [4,16,-4.2097,0,-10.1629,-4.5924,0,-11.0868,0,0,-12,0,0,-11],
// 4 16 0 0 -11 0 0 -12 4.5924 0 -11.0868 4.2097 0 -10.1629
  [4,16,0,0,-11,0,0,-12,4.5924,0,-11.0868,4.2097,0,-10.1629],
// 4 16 4.2097 0 -10.1629 4.5924 0 -11.0868 8.4852 0 -8.4852 7.7781 0 -7.7781
  [4,16,4.2097,0,-10.1629,4.5924,0,-11.0868,8.4852,0,-8.4852,7.7781,0,-7.7781],
// 4 16 7.7781 0 -7.7781 8.4852 0 -8.4852 11.0868 0 -4.5924 10.1629 0 -4.2097
  [4,16,7.7781,0,-7.7781,8.4852,0,-8.4852,11.0868,0,-4.5924,10.1629,0,-4.2097],
// 4 16 10.1629 0 -4.2097 11.0868 0 -4.5924 12 0 0 11 0 0
  [4,16,10.1629,0,-4.2097,11.0868,0,-4.5924,12,0,0,11,0,0],
// 0
];
module ldraw_lib__4_4rin11(step=0, col=false, unit=2/5, alt=false, line=0.2, solid=!$preview)
    makepoly(ldraw_lib__4_4rin11(solid), step=step, col=col, unit=unit, alt=alt, line=line, solid=solid);
ldraw_lib__4_4rin11(line=0.2);
// file: ../p/4-4edge.scad
use <../lib.scad>
$fa=1; $fs=0.2;
function ldraw_lib__4_4edge(realsolid=false) = [
// 0 Circle 1.0
// 0 Name: 4-4edge.dat
// 0 Author: James Jessiman
// 0 !LDRAW_ORG Primitive UPDATE 2017-01
// 0 !LICENSE Licensed under CC BY 2.0 and CC BY 4.0 : see CAreadme.txt
// 
// 0 BFC CERTIFY CCW
  [0,"BFC","CERTIFY"],
  [0,"BFC","CCW"],
// 
// 0 !HISTORY 1998-12-15 [PTadmin] Official Update 1998-10
// 0 !HISTORY 2005-12-28 [PTadmin] Official Update 2005-01
// 0 !HISTORY 2007-06-24 [PTadmin] Header formatted for Contributor Agreement
// 0 !HISTORY 2008-07-01 [PTadmin] Official Update 2008-01
// 0 !HISTORY 2017-01-15 [Steffen] BFCed
// 0 !HISTORY 2017-12-30 [PTadmin] Official Update 2017-01
// 
// 
// 2 24 1 0 0 0.9239 0 0.3827
  [2,24,1,0,0,0.9239,0,0.3827],
// 2 24 0.9239 0 0.3827 0.7071 0 0.7071
  [2,24,0.9239,0,0.3827,0.7071,0,0.7071],
// 2 24 0.7071 0 0.7071 0.3827 0 0.9239
  [2,24,0.7071,0,0.7071,0.3827,0,0.9239],
// 2 24 0.3827 0 0.9239 0 0 1
  [2,24,0.3827,0,0.9239,0,0,1],
// 2 24 0 0 1 -0.3827 0 0.9239
  [2,24,0,0,1,-0.3827,0,0.9239],
// 2 24 -0.3827 0 0.9239 -0.7071 0 0.7071
  [2,24,-0.3827,0,0.9239,-0.7071,0,0.7071],
// 2 24 -0.7071 0 0.7071 -0.9239 0 0.3827
  [2,24,-0.7071,0,0.7071,-0.9239,0,0.3827],
// 2 24 -0.9239 0 0.3827 -1 0 -0
  [2,24,-0.9239,0,0.3827,-1,0,-0],
// 2 24 -1 0 -0 -0.9239 0 -0.3827
  [2,24,-1,0,-0,-0.9239,0,-0.3827],
// 2 24 -0.9239 0 -0.3827 -0.7071 0 -0.7071
  [2,24,-0.9239,0,-0.3827,-0.7071,0,-0.7071],
// 2 24 -0.7071 0 -0.7071 -0.3827 0 -0.9239
  [2,24,-0.7071,0,-0.7071,-0.3827,0,-0.9239],
// 2 24 -0.3827 0 -0.9239 0 0 -1
  [2,24,-0.3827,0,-0.9239,0,0,-1],
// 2 24 0 0 -1 0.3827 0 -0.9239
  [2,24,0,0,-1,0.3827,0,-0.9239],
// 2 24 0.3827 0 -0.9239 0.7071 0 -0.7071
  [2,24,0.3827,0,-0.9239,0.7071,0,-0.7071],
// 2 24 0.7071 0 -0.7071 0.9239 0 -0.3827
  [2,24,0.7071,0,-0.7071,0.9239,0,-0.3827],
// 2 24 0.9239 0 -0.3827 1 0 0
  [2,24,0.9239,0,-0.3827,1,0,0],
];
module ldraw_lib__4_4edge(step=0, col=false, unit=2/5, alt=false, line=0.2, solid=!$preview)
    makepoly(ldraw_lib__4_4edge(solid), step=step, col=col, unit=unit, alt=alt, line=line, solid=solid);
ldraw_lib__4_4edge(line=0.2);
// file: ../p/4-4disc.scad
use <../lib.scad>
$fa=1; $fs=0.2;
function ldraw_lib__4_4disc(realsolid=false) = [
// 0 Disc 1.0
// 0 Name: 4-4disc.dat
// 0 Author: James Jessiman
// 0 !LDRAW_ORG Primitive UPDATE 2002-02
// 0 !LICENSE Licensed under CC BY 2.0 and CC BY 4.0 : see CAreadme.txt
// 
// 0 BFC CERTIFY CCW
  [0,"BFC","CERTIFY"],
  [0,"BFC","CCW"],
// 
// 0 !HISTORY 1998-12-15 [PTadmin] Official Update 1998-10
// 0 !HISTORY 2002-03-23 [sbliss] Added BFC statement
// 0 !HISTORY 2002-04-25 [PTadmin] Official Update 2002-02
// 0 !HISTORY 2007-06-24 [PTadmin] Header formatted for Contributor Agreement
// 0 !HISTORY 2008-07-01 [PTadmin] Official Update 2008-01
// 
// 
// 3 16 0 0 0 1 0 0 0.9239 0 0.3827
  [3,16,0,0,0,1,0,0,0.9239,0,0.3827],
// 3 16 0 0 0 0.9239 0 0.3827 0.7071 0 0.7071
  [3,16,0,0,0,0.9239,0,0.3827,0.7071,0,0.7071],
// 3 16 0 0 0 0.7071 0 0.7071 0.3827 0 0.9239
  [3,16,0,0,0,0.7071,0,0.7071,0.3827,0,0.9239],
// 3 16 0 0 0 0.3827 0 0.9239 0 0 1
  [3,16,0,0,0,0.3827,0,0.9239,0,0,1],
// 3 16 0 0 0 0 0 1 -0.3827 0 0.9239
  [3,16,0,0,0,0,0,1,-0.3827,0,0.9239],
// 3 16 0 0 0 -0.3827 0 0.9239 -0.7071 0 0.7071
  [3,16,0,0,0,-0.3827,0,0.9239,-0.7071,0,0.7071],
// 3 16 0 0 0 -0.7071 0 0.7071 -0.9239 0 0.3827
  [3,16,0,0,0,-0.7071,0,0.7071,-0.9239,0,0.3827],
// 3 16 0 0 0 -0.9239 0 0.3827 -1 0 -0
  [3,16,0,0,0,-0.9239,0,0.3827,-1,0,-0],
// 3 16 0 0 0 -1 0 -0 -0.9239 0 -0.3827
  [3,16,0,0,0,-1,0,-0,-0.9239,0,-0.3827],
// 3 16 0 0 0 -0.9239 0 -0.3827 -0.7071 0 -0.7071
  [3,16,0,0,0,-0.9239,0,-0.3827,-0.7071,0,-0.7071],
// 3 16 0 0 0 -0.7071 0 -0.7071 -0.3827 0 -0.9239
  [3,16,0,0,0,-0.7071,0,-0.7071,-0.3827,0,-0.9239],
// 3 16 0 0 0 -0.3827 0 -0.9239 0 0 -1
  [3,16,0,0,0,-0.3827,0,-0.9239,0,0,-1],
// 3 16 0 0 0 0 0 -1 0.3827 0 -0.9239
  [3,16,0,0,0,0,0,-1,0.3827,0,-0.9239],
// 3 16 0 0 0 0.3827 0 -0.9239 0.7071 0 -0.7071
  [3,16,0,0,0,0.3827,0,-0.9239,0.7071,0,-0.7071],
// 3 16 0 0 0 0.7071 0 -0.7071 0.9239 0 -0.3827
  [3,16,0,0,0,0.7071,0,-0.7071,0.9239,0,-0.3827],
// 3 16 0 0 0 0.9239 0 -0.3827 1 0 0
  [3,16,0,0,0,0.9239,0,-0.3827,1,0,0],
// 0
];
module ldraw_lib__4_4disc(step=0, col=false, unit=2/5, alt=false, line=0.2, solid=!$preview)
    makepoly(ldraw_lib__4_4disc(solid), step=step, col=col, unit=unit, alt=alt, line=line, solid=solid);
ldraw_lib__4_4disc(line=0.2);
// file: ../p/4-4cyli.scad
use <../lib.scad>
$fa=1; $fs=0.2;
function ldraw_lib__4_4cyli(realsolid=false) = [
// 0 Cylinder 1.0
// 0 Name: 4-4cyli.dat
// 0 Author: James Jessiman
// 0 !LDRAW_ORG Primitive UPDATE 2005-01
// 0 !LICENSE Licensed under CC BY 2.0 and CC BY 4.0 : see CAreadme.txt
// 
// 0 BFC CERTIFY CCW
  [0,"BFC","CERTIFY"],
  [0,"BFC","CCW"],
// 
// 0 !HISTORY 1998-12-15 [PTadmin] Official Update 1998-10
// 0 !HISTORY 2002-03-23 [sbliss] Added BFC statement; merged headers from files in distributions LDraw 0.27 and Complete.
// 0 !HISTORY 2002-04-25 [PTadmin] Official Update 2002-02
// 0 !HISTORY 2004-12-14 [guyvivan] BFC CCW
// 0 !HISTORY 2005-12-28 [PTadmin] Official Update 2005-01
// 0 !HISTORY 2007-06-24 [PTadmin] Header formatted for Contributor Agreement
// 0 !HISTORY 2008-07-01 [PTadmin] Official Update 2008-01
// 
// 
// 4 16 1 1 0 0.9239 1 0.3827 0.9239 0 0.3827 1 0 0
  [4,16,1,1,0,0.9239,1,0.3827,0.9239,0,0.3827,1,0,0],
// 5 24 1 0 0 1 1 0 0.9239 0 0.3827 0.9239 0 -0.3827
  [5,24,1,0,0,1,1,0,0.9239,0,0.3827,0.9239,0,-0.3827],
// 4 16 0.9239 1 0.3827 0.7071 1 0.7071 0.7071 0 0.7071 0.9239 0 0.3827
  [4,16,0.9239,1,0.3827,0.7071,1,0.7071,0.7071,0,0.7071,0.9239,0,0.3827],
// 5 24 0.9239 0 0.3827 0.9239 1 0.3827 0.7071 0 0.7071 1 0 0
  [5,24,0.9239,0,0.3827,0.9239,1,0.3827,0.7071,0,0.7071,1,0,0],
// 4 16 0.7071 1 0.7071 0.3827 1 0.9239 0.3827 0 0.9239 0.7071 0 0.7071
  [4,16,0.7071,1,0.7071,0.3827,1,0.9239,0.3827,0,0.9239,0.7071,0,0.7071],
// 5 24 0.7071 0 0.7071 0.7071 1 0.7071 0.3827 0 0.9239 0.9239 0 0.3827
  [5,24,0.7071,0,0.7071,0.7071,1,0.7071,0.3827,0,0.9239,0.9239,0,0.3827],
// 4 16 0.3827 1 0.9239 0 1 1 0 0 1 0.3827 0 0.9239
  [4,16,0.3827,1,0.9239,0,1,1,0,0,1,0.3827,0,0.9239],
// 5 24 0.3827 0 0.9239 0.3827 1 0.9239 0 0 1 0.7071 0 0.7071
  [5,24,0.3827,0,0.9239,0.3827,1,0.9239,0,0,1,0.7071,0,0.7071],
// 4 16 0 1 1 -0.3827 1 0.9239 -0.3827 0 0.9239 0 0 1
  [4,16,0,1,1,-0.3827,1,0.9239,-0.3827,0,0.9239,0,0,1],
// 5 24 0 0 1 0 1 1 -0.3827 0 0.9239 0.3827 0 0.9239
  [5,24,0,0,1,0,1,1,-0.3827,0,0.9239,0.3827,0,0.9239],
// 4 16 -0.3827 1 0.9239 -0.7071 1 0.7071 -0.7071 0 0.7071 -0.3827 0 0.9239
  [4,16,-0.3827,1,0.9239,-0.7071,1,0.7071,-0.7071,0,0.7071,-0.3827,0,0.9239],
// 5 24 -0.3827 0 0.9239 -0.3827 1 0.9239 -0.7071 0 0.7071 0 0 1
  [5,24,-0.3827,0,0.9239,-0.3827,1,0.9239,-0.7071,0,0.7071,0,0,1],
// 4 16 -0.7071 1 0.7071 -0.9239 1 0.3827 -0.9239 0 0.3827 -0.7071 0 0.7071
  [4,16,-0.7071,1,0.7071,-0.9239,1,0.3827,-0.9239,0,0.3827,-0.7071,0,0.7071],
// 5 24 -0.7071 0 0.7071 -0.7071 1 0.7071 -0.9239 0 0.3827 -0.3827 0 0.9239
  [5,24,-0.7071,0,0.7071,-0.7071,1,0.7071,-0.9239,0,0.3827,-0.3827,0,0.9239],
// 4 16 -0.9239 1 0.3827 -1 1 0 -1 0 0 -0.9239 0 0.3827
  [4,16,-0.9239,1,0.3827,-1,1,0,-1,0,0,-0.9239,0,0.3827],
// 5 24 -0.9239 0 0.3827 -0.9239 1 0.3827 -1 0 0 -0.7071 0 0.7071
  [5,24,-0.9239,0,0.3827,-0.9239,1,0.3827,-1,0,0,-0.7071,0,0.7071],
// 4 16 -1 1 0 -0.9239 1 -0.3827 -0.9239 0 -0.3827 -1 0 0
  [4,16,-1,1,0,-0.9239,1,-0.3827,-0.9239,0,-0.3827,-1,0,0],
// 5 24 -1 0 0 -1 1 0 -0.9239 0 -0.3827 -0.9239 0 0.3827
  [5,24,-1,0,0,-1,1,0,-0.9239,0,-0.3827,-0.9239,0,0.3827],
// 4 16 -0.9239 1 -0.3827 -0.7071 1 -0.7071 -0.7071 0 -0.7071 -0.9239 0 -0.3827
  [4,16,-0.9239,1,-0.3827,-0.7071,1,-0.7071,-0.7071,0,-0.7071,-0.9239,0,-0.3827],
// 5 24 -0.9239 0 -0.3827 -0.9239 1 -0.3827 -0.7071 0 -0.7071 -1 0 0
  [5,24,-0.9239,0,-0.3827,-0.9239,1,-0.3827,-0.7071,0,-0.7071,-1,0,0],
// 4 16 -0.7071 1 -0.7071 -0.3827 1 -0.9239 -0.3827 0 -0.9239 -0.7071 0 -0.7071
  [4,16,-0.7071,1,-0.7071,-0.3827,1,-0.9239,-0.3827,0,-0.9239,-0.7071,0,-0.7071],
// 5 24 -0.7071 0 -0.7071 -0.7071 1 -0.7071 -0.3827 0 -0.9239 -0.9239 0 -0.3827
  [5,24,-0.7071,0,-0.7071,-0.7071,1,-0.7071,-0.3827,0,-0.9239,-0.9239,0,-0.3827],
// 4 16 -0.3827 1 -0.9239 0 1 -1 0 0 -1 -0.3827 0 -0.9239
  [4,16,-0.3827,1,-0.9239,0,1,-1,0,0,-1,-0.3827,0,-0.9239],
// 5 24 -0.3827 0 -0.9239 -0.3827 1 -0.9239 0 0 -1 -0.7071 0 -0.7071
  [5,24,-0.3827,0,-0.9239,-0.3827,1,-0.9239,0,0,-1,-0.7071,0,-0.7071],
// 4 16 0 1 -1 0.3827 1 -0.9239 0.3827 0 -0.9239 0 0 -1
  [4,16,0,1,-1,0.3827,1,-0.9239,0.3827,0,-0.9239,0,0,-1],
// 5 24 0 0 -1 0 1 -1 0.3827 0 -0.9239 -0.3827 0 -0.9239
  [5,24,0,0,-1,0,1,-1,0.3827,0,-0.9239,-0.3827,0,-0.9239],
// 4 16 0.3827 1 -0.9239 0.7071 1 -0.7071 0.7071 0 -0.7071 0.3827 0 -0.9239
  [4,16,0.3827,1,-0.9239,0.7071,1,-0.7071,0.7071,0,-0.7071,0.3827,0,-0.9239],
// 5 24 0.3827 0 -0.9239 0.3827 1 -0.9239 0.7071 0 -0.7071 0 0 -1
  [5,24,0.3827,0,-0.9239,0.3827,1,-0.9239,0.7071,0,-0.7071,0,0,-1],
// 4 16 0.7071 1 -0.7071 0.9239 1 -0.3827 0.9239 0 -0.3827 0.7071 0 -0.7071
  [4,16,0.7071,1,-0.7071,0.9239,1,-0.3827,0.9239,0,-0.3827,0.7071,0,-0.7071],
// 5 24 0.7071 0 -0.7071 0.7071 1 -0.7071 0.9239 0 -0.3827 0.3827 0 -0.9239
  [5,24,0.7071,0,-0.7071,0.7071,1,-0.7071,0.9239,0,-0.3827,0.3827,0,-0.9239],
// 4 16 0.9239 1 -0.3827 1 1 0 1 0 0 0.9239 0 -0.3827
  [4,16,0.9239,1,-0.3827,1,1,0,1,0,0,0.9239,0,-0.3827],
// 5 24 0.9239 0 -0.3827 0.9239 1 -0.3827 1 0 0 0.7071 0 -0.7071
  [5,24,0.9239,0,-0.3827,0.9239,1,-0.3827,1,0,0,0.7071,0,-0.7071],
// 0
];
module ldraw_lib__4_4cyli(step=0, col=false, unit=2/5, alt=false, line=0.2, solid=!$preview)
    makepoly(ldraw_lib__4_4cyli(solid), step=step, col=col, unit=unit, alt=alt, line=line, solid=solid);
ldraw_lib__4_4cyli(line=0.2);
// file: 3004.scad
use <../lib.scad>
use <s/3004s01.scad>
$fa=1; $fs=0.2;
function ldraw_lib__3004(realsolid=false) = [
// 0 Brick  1 x  2
// 0 Name: 3004.dat
// 0 Author: James Jessiman
// 0 !LDRAW_ORG Part UPDATE 2022-05
// 0 !LICENSE Licensed under CC BY 2.0 and CC BY 4.0 : see CAreadme.txt
// 
// 0 BFC CERTIFY CCW
  [0,"BFC","CERTIFY"],
  [0,"BFC","CCW"],
// 
// 0 !HISTORY 2001-10-26 [PTadmin] Official Update 2001-01
// 0 !HISTORY 2002-05-07 {unknown} BFC Certification
// 0 !HISTORY 2002-06-11 [PTadmin] Official Update 2002-03
// 0 !HISTORY 2007-05-07 [PTadmin] Header formatted for Contributor Agreement
// 0 !HISTORY 2008-07-01 [PTadmin] Official Update 2008-01
// 0 !HISTORY 2022-08-04 [MagFors] Using subfile
// 0 !HISTORY 2022-09-15 [PTadmin] Official Update 2022-05
// 
// 
// 1 16 0 0 0 1 0 0 0 1 0 0 0 1 s\3004s01.dat
  [1,16,0,0,0,1,0,0,0,1,0,0,0,1, ldraw_lib__s__3004s01(realsolid)],
// 4 16 -20 24 -10 20 24 -10 20 0 -10 -20 0 -10
  [4,16,-20,24,-10,20,24,-10,20,0,-10,-20,0,-10],
];
module ldraw_lib__3004(step=0, col=false, unit=2/5, alt=false, line=0.2, solid=!$preview)
    makepoly(ldraw_lib__3004(solid), step=step, col=col, unit=unit, alt=alt, line=line, solid=solid);
ldraw_lib__3004(line=0.2);
// file: 32134.scad
use <../lib.scad>
use <../p/4-4cyli.scad>
use <../p/4-4disc.scad>
use <../p/4-4edge.scad>
use <../p/4-4rin11.scad>
use <../p/4-4rin12.scad>
use <../p/4-8sphe.scad>
$fa=1; $fs=0.2;
function ldraw_lib__32134(realsolid=false) = [
// 0 ~Technic Competition Arrow Rubber Tip
// 0 Name: 32134.dat
// 0 Author: Marc Klein [marckl]
// 0 !LDRAW_ORG Part UPDATE 2013-01
// 0 !LICENSE Licensed under CC BY 2.0 and CC BY 4.0 : see CAreadme.txt
// 
// 0 BFC CERTIFY CCW
  [0,"BFC","CERTIFY"],
  [0,"BFC","CCW"],
// 
// 0 !CMDLINE -c256
// 
// 0 !HISTORY 2004-11-01 [sbliss] Replaced polygons with primitives; BFC'ed
// 0 !HISTORY 2004-11-06 [PTadmin] Official Update 2004-04
// 0 !HISTORY 2007-05-13 [PTadmin] Header formatted for Contributor Agreement
// 0 !HISTORY 2008-07-01 [PTadmin] Official Update 2008-01
// 0 !HISTORY 2009-06-08 [PTadmin] Renamed from 155
// 0 !HISTORY 2010-11-14 [Steffen] adjusted origin
// 0 !HISTORY 2013-07-21 [PTadmin] Official Update 2013-01
// 
// 
// 0 // Created with stl2dat conversion tool
// 
// 1 16 0 0 14 22 0 0 0 0 22 0 -1 0 4-4edge.dat
  [1,16,0,0,14,22,0,0,0,0,22,0,-1,0, ldraw_lib__4_4edge(realsolid)],
// 1 16 0 0 0 22 0 0 0 0 22 0 -1 0 4-4edge.dat
  [1,16,0,0,0,22,0,0,0,0,22,0,-1,0, ldraw_lib__4_4edge(realsolid)],
// 0 BFC INVERTNEXT
  [0,"BFC","INVERTNEXT"],
// 1 16 0 0 14 22 0 0 0 0 22 0 -14 0 4-4cyli.dat
  [1,16,0,0,14,22,0,0,0,0,22,0,-14,0, ldraw_lib__4_4cyli(realsolid)],
// 1 16 0 0 16 26 0 0 0 0 26 0 -16 0 4-4cyli.dat
  [1,16,0,0,16,26,0,0,0,0,26,0,-16,0, ldraw_lib__4_4cyli(realsolid)],
// 1 16 0 0 0 26 0 0 0 0 26 0 -1 0 4-4edge.dat
  [1,16,0,0,0,26,0,0,0,0,26,0,-1,0, ldraw_lib__4_4edge(realsolid)],
// 1 16 0 0 16 26 0 0 0 0 26 0 26 0 4-8sphe.dat
  [1,16,0,0,16,26,0,0,0,0,26,0,26,0, ldraw_lib__4_8sphe(realsolid)],
// 1 16 0 0 14 22 0 0 0 0 22 0 1 0 4-4disc.dat
  [1,16,0,0,14,22,0,0,0,0,22,0,1,0, ldraw_lib__4_4disc(realsolid)],
// 1 16 0 0 0 2 0 0 0 0 2 0 1 0 4-4rin11.dat
  [1,16,0,0,0,2,0,0,0,0,2,0,1,0, ldraw_lib__4_4rin11(realsolid)],
// 1 16 0 0 0 2 0 0 0 0 2 0 1 0 4-4rin12.dat
  [1,16,0,0,0,2,0,0,0,0,2,0,1,0, ldraw_lib__4_4rin12(realsolid)],
// 
];
module ldraw_lib__32134(step=0, col=false, unit=2/5, alt=false, line=0.2, solid=!$preview)
    makepoly(ldraw_lib__32134(solid), step=step, col=col, unit=unit, alt=alt, line=line, solid=solid);
ldraw_lib__32134(line=0.2);
// main file
use <../lib.scad>
use <32134.scad>
$fa=1; $fs=0.2;
function ldraw_lib__155(realsolid=false) = [
// 0 ~Moved to 32134
// 0 Name: 155.dat
// 0 Author: [PTadmin]
// 0 !LDRAW_ORG Part UPDATE 2013-01
// 0 !LICENSE Licensed under CC BY 4.0 : see CAreadme.txt
// 
// 0 BFC CERTIFY CCW
  [0,"BFC","CERTIFY"],
  [0,"BFC","CCW"],
// 
// 0 !HISTORY 2013-07-21 [PTadmin] Official Update 2013-01
// 
// 
// 0 // ~Technic Competition Arrow Rubber Tip
// 1 16 0 0 61 1 0 0 0 1 0 0 0 1 32134.dat
  [1,16,0,0,61,1,0,0,0,1,0,0,0,1, ldraw_lib__32134(realsolid)],
// 
];
module ldraw_lib__155(step=0, col=false, unit=2/5, alt=false, line=0.2, solid=!$preview)
    makepoly(ldraw_lib__155(solid), step=step, col=col, unit=unit, alt=alt, line=line, solid=solid);
ldraw_lib__155(line=0.2);
